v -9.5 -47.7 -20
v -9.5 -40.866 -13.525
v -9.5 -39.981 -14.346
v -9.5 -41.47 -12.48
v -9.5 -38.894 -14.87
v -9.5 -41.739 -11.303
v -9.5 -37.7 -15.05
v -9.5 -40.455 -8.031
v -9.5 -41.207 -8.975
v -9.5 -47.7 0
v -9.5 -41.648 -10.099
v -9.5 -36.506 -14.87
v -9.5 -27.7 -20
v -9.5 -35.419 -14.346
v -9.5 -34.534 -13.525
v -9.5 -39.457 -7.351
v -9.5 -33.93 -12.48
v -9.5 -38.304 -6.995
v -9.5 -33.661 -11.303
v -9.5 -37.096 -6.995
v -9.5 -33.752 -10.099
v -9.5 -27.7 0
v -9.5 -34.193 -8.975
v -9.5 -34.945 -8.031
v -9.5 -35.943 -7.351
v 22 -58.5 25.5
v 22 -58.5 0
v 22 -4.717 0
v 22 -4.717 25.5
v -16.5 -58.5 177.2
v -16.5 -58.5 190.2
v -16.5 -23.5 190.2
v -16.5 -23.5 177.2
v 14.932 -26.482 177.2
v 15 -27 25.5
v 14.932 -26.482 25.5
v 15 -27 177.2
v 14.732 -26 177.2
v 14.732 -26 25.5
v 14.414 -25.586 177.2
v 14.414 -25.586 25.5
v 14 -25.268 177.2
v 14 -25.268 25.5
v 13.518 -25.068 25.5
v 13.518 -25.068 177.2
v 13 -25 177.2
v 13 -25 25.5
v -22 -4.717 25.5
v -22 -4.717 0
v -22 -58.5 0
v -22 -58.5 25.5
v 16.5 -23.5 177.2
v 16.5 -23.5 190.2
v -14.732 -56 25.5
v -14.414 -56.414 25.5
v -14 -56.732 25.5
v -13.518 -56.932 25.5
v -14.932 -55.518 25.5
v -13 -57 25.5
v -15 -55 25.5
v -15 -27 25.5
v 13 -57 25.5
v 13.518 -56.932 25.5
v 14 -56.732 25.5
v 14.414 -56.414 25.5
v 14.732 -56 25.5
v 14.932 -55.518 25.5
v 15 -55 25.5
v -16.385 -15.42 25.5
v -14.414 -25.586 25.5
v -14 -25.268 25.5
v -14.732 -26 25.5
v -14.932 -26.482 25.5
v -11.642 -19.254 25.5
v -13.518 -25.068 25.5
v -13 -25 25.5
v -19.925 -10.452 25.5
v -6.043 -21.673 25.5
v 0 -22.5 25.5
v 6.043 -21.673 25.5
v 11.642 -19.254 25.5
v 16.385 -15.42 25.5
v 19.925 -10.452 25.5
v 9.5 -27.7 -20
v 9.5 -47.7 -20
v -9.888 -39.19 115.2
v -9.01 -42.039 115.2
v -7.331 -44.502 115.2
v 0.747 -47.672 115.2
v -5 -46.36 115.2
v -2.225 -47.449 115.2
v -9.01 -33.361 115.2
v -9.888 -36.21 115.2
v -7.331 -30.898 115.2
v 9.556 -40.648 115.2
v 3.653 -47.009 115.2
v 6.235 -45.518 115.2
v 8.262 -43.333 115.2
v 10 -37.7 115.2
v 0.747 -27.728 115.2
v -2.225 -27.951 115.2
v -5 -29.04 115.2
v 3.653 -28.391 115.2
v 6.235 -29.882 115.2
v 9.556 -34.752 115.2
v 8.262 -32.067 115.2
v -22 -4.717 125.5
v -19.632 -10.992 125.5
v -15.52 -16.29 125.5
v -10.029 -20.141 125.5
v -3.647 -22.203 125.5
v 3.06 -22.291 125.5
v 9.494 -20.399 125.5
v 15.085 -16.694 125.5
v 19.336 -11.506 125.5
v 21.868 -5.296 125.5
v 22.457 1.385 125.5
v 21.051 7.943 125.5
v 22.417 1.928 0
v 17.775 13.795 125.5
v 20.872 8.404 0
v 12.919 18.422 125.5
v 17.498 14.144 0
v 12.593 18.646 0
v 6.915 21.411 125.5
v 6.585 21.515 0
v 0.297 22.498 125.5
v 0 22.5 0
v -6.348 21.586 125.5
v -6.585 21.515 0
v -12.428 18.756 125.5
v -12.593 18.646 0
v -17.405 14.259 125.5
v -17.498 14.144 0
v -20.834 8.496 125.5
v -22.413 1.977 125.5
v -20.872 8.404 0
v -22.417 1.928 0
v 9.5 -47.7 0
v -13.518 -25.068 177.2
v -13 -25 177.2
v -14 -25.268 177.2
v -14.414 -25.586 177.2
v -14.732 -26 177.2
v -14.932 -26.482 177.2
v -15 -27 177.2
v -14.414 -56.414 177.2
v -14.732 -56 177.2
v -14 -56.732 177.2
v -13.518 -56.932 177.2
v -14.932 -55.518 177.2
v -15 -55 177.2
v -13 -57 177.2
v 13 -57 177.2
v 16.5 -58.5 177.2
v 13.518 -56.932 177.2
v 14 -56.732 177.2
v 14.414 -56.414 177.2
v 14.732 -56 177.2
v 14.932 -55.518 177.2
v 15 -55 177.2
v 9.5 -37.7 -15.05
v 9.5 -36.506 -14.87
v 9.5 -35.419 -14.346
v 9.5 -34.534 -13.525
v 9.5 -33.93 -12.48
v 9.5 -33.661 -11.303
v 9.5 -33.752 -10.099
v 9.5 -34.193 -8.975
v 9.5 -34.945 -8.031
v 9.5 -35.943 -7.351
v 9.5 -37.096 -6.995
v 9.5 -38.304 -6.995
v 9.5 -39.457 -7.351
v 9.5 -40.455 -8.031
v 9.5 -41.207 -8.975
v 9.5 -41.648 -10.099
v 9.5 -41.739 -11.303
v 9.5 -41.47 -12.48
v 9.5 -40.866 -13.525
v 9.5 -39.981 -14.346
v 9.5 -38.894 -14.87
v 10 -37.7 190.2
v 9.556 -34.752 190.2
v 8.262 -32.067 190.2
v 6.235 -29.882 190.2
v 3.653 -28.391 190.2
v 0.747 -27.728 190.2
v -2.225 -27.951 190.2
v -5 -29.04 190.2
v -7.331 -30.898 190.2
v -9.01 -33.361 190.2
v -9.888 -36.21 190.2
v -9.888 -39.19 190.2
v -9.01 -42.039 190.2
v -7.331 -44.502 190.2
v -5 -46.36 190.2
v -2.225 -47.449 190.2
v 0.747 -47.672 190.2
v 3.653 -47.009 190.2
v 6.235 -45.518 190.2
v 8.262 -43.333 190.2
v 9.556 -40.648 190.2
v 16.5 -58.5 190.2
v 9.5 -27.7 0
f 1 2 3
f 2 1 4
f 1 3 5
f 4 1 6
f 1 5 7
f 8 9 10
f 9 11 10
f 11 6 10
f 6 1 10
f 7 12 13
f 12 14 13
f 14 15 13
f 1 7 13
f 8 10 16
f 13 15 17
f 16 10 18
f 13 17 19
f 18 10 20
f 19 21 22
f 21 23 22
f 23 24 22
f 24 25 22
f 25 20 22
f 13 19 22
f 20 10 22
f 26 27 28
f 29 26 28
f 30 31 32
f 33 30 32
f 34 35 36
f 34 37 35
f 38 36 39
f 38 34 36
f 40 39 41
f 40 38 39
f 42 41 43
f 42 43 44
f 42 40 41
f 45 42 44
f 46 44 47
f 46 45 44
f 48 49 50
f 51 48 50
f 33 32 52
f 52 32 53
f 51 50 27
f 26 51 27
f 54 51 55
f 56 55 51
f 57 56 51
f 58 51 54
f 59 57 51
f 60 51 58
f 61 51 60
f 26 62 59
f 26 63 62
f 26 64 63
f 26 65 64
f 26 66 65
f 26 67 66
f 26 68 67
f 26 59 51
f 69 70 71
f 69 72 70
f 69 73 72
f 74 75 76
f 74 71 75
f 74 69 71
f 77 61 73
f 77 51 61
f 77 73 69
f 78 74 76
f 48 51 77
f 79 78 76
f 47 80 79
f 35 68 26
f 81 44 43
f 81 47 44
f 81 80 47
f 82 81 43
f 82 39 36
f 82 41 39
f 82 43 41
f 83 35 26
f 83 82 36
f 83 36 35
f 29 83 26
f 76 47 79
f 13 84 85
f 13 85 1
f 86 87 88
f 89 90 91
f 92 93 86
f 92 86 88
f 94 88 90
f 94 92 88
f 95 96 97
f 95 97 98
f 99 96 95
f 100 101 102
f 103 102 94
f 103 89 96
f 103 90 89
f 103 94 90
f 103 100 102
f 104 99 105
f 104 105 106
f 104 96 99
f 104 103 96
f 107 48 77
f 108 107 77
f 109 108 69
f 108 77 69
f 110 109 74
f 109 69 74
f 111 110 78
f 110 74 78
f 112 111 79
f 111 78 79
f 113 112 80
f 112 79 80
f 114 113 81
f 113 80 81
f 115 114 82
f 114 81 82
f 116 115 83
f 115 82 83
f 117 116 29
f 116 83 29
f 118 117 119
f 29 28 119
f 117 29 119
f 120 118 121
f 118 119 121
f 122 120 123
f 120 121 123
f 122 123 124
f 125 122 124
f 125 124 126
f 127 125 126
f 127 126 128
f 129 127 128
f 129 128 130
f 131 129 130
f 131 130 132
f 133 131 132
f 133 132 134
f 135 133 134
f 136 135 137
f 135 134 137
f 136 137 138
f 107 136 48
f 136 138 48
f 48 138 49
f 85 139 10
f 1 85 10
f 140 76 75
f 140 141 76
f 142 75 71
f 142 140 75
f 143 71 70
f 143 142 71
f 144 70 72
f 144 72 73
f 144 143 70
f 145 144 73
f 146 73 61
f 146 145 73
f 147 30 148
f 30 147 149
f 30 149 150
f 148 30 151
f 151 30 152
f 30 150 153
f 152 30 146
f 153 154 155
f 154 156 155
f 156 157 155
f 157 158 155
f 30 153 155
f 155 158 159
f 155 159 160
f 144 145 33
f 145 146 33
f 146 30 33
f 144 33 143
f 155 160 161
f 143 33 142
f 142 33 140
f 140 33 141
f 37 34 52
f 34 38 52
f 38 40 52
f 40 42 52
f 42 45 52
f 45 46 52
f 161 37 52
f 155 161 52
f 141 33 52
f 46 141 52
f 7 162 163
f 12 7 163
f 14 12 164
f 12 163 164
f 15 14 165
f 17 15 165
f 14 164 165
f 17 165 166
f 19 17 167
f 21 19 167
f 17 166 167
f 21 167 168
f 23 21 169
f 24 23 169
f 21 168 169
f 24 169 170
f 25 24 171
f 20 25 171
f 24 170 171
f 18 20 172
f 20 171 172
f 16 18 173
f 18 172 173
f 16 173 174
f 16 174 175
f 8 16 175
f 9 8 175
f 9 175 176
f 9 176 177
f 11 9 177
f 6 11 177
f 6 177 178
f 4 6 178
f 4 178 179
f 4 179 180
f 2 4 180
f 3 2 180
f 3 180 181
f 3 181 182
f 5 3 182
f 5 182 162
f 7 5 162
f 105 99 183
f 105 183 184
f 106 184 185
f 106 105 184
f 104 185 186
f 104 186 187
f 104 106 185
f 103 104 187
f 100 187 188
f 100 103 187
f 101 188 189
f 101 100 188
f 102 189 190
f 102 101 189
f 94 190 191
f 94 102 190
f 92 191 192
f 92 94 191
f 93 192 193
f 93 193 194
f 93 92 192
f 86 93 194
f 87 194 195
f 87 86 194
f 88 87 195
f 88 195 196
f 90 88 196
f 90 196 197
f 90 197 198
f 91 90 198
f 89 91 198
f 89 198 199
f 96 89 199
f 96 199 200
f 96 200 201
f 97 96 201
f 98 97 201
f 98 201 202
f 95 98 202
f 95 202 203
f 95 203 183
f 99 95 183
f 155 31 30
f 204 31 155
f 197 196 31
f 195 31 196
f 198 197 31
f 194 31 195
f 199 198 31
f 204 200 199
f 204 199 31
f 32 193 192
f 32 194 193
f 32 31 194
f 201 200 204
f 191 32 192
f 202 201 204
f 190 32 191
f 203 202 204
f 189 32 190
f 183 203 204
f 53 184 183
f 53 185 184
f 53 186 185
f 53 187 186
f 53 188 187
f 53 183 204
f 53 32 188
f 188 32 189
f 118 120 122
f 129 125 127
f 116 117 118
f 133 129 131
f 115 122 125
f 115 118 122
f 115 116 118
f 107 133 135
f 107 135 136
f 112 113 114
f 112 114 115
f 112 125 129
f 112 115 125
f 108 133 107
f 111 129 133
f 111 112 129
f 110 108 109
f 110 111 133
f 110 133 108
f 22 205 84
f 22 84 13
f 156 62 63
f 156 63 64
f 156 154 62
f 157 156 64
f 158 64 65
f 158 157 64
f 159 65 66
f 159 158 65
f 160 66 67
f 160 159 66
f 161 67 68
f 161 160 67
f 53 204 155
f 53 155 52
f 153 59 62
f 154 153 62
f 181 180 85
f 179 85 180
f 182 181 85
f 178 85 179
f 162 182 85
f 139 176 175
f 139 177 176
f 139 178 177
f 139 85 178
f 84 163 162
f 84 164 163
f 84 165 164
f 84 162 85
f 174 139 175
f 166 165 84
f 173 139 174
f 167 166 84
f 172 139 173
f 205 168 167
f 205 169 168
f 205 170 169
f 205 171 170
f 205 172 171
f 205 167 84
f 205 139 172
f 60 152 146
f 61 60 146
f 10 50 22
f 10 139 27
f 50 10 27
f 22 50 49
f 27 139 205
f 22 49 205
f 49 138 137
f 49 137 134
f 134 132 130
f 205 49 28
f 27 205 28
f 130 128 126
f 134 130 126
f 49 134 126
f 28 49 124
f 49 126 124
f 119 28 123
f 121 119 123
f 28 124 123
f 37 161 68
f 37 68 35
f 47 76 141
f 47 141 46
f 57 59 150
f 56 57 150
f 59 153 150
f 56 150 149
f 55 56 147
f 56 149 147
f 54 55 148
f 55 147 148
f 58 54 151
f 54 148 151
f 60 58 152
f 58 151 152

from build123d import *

# Parameters (mm, degrees)
BOSS_EXTRUDE1_DEPTH     = 25.5
SKETCH2_R               = 22.5
BOSS_EXTRUDE2_DEPTH     = 100
SKETCH3_W               = 30
SKETCH3_H               = 32
BOSS_EXTRUDE3_DEPTH     = 164.7
SKETCH4_W               = 19
SKETCH4_H               = 20
BOSS_EXTRUDE4_DEPTH     = 20
SKETCH5_R               = 4.05
CUT_EXTRUDE1_DEPTH      = 202.549720913
SKETCH6_R               = 10
BOSS_EXTRUDE5_DEPTH     = 25
SKETCH7_W               = 33
SKETCH7_H               = 35
BOSS_EXTRUDE6_DEPTH     = 13
CUT_EXTRUDE2_DEPTH      = 225.141785484
CUT_EXTRUDE2_DEPTH_BACK = 225.141785484
SKETCH8_R               = 4.05
FILLET1_R               = 2
CUT_EXTRUDE3_START      = -100
SKETCH9_R               = 10
CUT_EXTRUDE3_DEPTH      = 100


with BuildPart() as part:
    # Sketch1 → Boss-Extrude1 (new body)
    with BuildSketch(Plane.XY):
        with BuildLine():
            Line((-22, -4.716990566), (-22, -58.5))
            Line((-22, -58.5), (22, -58.5))
            Line((22, -58.5), (22, -4.716990566))
            ThreePointArc((22, -4.716990566), (0, 22.5), (-22, -4.716990566))
        make_face()
    extrude(amount=BOSS_EXTRUDE1_DEPTH)

    # Sketch2 → Boss-Extrude2 (add)
    with BuildSketch(Plane.XY.offset(25.5)):
        with Locations(Location((0, 0, 0), (0, 0, 192.101492032))):
            Circle(SKETCH2_R)
    extrude(amount=BOSS_EXTRUDE2_DEPTH)

    # Sketch3 → Boss-Extrude3 (add)
    with BuildSketch(Plane.XY.offset(25.5)):
        with Locations((0, -41)):
            Rectangle(SKETCH3_W, SKETCH3_H)
    extrude(amount=BOSS_EXTRUDE3_DEPTH)

    # Sketch4 → Boss-Extrude4 (add)
    with BuildSketch(Plane(origin=(0, 0, 0), x_dir=(-1, 0, 0), z_dir=(0, 0, -1))):
        with Locations((0, -37.7)):
            Rectangle(SKETCH4_W, SKETCH4_H)
    extrude(amount=BOSS_EXTRUDE4_DEPTH)

    # Sketch5 → Cut-Extrude1 (cut, through all)
    with BuildSketch(Plane(origin=(9.5, 0, 0), x_dir=(0, 0, -1), z_dir=(1, 0, 0))):
        with Locations((11, -37.7)):
            Circle(SKETCH5_R)
    extrude(amount=-CUT_EXTRUDE1_DEPTH, mode=Mode.SUBTRACT)

    # Sketch6 → Boss-Extrude5 (add)
    with BuildSketch(Plane.XY.offset(190.2)):
        with Locations((0, -37.7)):
            Circle(SKETCH6_R)
    extrude(amount=BOSS_EXTRUDE5_DEPTH)

    # Sketch7 → Boss-Extrude6 (add)
    with BuildSketch(Plane.XY.offset(190.2)):
        with Locations((0, -41)):
            Rectangle(SKETCH7_W, SKETCH7_H)
    extrude(amount=-BOSS_EXTRUDE6_DEPTH)

    # Sketch8 → Cut-Extrude2 (cut, two sides: drawn at the far end of the back side and taken through both)
    with BuildSketch(Plane(origin=(0, 0, 0), x_dir=(0, 0, -1), z_dir=(1, 0, 0)).offset(-CUT_EXTRUDE2_DEPTH_BACK)):
        with Locations(Location((-205.2, -37.7, 0), (0, 0, 179.999999993))):
            Circle(SKETCH8_R)
    extrude(amount=CUT_EXTRUDE2_DEPTH + CUT_EXTRUDE2_DEPTH_BACK, mode=Mode.SUBTRACT)

    # Fillet1
    fillet1_edges = [part.edges().sort_by_distance(p)[0] for p in [
        (15, -57, 101.35),
        (-15, -57, 101.35),
        (-15, -25, 101.35),
        (15, -25, 101.35),
    ]]
    fillet(fillet1_edges, radius=FILLET1_R)

    # Sketch9 → Cut-Extrude3 (cut)
    with BuildSketch(Plane.XY.offset(215.2).offset(CUT_EXTRUDE3_START)):
        with Locations((0, -37.7)):
            Circle(SKETCH9_R)
    extrude(amount=CUT_EXTRUDE3_DEPTH, mode=Mode.SUBTRACT)


solid = part.part
